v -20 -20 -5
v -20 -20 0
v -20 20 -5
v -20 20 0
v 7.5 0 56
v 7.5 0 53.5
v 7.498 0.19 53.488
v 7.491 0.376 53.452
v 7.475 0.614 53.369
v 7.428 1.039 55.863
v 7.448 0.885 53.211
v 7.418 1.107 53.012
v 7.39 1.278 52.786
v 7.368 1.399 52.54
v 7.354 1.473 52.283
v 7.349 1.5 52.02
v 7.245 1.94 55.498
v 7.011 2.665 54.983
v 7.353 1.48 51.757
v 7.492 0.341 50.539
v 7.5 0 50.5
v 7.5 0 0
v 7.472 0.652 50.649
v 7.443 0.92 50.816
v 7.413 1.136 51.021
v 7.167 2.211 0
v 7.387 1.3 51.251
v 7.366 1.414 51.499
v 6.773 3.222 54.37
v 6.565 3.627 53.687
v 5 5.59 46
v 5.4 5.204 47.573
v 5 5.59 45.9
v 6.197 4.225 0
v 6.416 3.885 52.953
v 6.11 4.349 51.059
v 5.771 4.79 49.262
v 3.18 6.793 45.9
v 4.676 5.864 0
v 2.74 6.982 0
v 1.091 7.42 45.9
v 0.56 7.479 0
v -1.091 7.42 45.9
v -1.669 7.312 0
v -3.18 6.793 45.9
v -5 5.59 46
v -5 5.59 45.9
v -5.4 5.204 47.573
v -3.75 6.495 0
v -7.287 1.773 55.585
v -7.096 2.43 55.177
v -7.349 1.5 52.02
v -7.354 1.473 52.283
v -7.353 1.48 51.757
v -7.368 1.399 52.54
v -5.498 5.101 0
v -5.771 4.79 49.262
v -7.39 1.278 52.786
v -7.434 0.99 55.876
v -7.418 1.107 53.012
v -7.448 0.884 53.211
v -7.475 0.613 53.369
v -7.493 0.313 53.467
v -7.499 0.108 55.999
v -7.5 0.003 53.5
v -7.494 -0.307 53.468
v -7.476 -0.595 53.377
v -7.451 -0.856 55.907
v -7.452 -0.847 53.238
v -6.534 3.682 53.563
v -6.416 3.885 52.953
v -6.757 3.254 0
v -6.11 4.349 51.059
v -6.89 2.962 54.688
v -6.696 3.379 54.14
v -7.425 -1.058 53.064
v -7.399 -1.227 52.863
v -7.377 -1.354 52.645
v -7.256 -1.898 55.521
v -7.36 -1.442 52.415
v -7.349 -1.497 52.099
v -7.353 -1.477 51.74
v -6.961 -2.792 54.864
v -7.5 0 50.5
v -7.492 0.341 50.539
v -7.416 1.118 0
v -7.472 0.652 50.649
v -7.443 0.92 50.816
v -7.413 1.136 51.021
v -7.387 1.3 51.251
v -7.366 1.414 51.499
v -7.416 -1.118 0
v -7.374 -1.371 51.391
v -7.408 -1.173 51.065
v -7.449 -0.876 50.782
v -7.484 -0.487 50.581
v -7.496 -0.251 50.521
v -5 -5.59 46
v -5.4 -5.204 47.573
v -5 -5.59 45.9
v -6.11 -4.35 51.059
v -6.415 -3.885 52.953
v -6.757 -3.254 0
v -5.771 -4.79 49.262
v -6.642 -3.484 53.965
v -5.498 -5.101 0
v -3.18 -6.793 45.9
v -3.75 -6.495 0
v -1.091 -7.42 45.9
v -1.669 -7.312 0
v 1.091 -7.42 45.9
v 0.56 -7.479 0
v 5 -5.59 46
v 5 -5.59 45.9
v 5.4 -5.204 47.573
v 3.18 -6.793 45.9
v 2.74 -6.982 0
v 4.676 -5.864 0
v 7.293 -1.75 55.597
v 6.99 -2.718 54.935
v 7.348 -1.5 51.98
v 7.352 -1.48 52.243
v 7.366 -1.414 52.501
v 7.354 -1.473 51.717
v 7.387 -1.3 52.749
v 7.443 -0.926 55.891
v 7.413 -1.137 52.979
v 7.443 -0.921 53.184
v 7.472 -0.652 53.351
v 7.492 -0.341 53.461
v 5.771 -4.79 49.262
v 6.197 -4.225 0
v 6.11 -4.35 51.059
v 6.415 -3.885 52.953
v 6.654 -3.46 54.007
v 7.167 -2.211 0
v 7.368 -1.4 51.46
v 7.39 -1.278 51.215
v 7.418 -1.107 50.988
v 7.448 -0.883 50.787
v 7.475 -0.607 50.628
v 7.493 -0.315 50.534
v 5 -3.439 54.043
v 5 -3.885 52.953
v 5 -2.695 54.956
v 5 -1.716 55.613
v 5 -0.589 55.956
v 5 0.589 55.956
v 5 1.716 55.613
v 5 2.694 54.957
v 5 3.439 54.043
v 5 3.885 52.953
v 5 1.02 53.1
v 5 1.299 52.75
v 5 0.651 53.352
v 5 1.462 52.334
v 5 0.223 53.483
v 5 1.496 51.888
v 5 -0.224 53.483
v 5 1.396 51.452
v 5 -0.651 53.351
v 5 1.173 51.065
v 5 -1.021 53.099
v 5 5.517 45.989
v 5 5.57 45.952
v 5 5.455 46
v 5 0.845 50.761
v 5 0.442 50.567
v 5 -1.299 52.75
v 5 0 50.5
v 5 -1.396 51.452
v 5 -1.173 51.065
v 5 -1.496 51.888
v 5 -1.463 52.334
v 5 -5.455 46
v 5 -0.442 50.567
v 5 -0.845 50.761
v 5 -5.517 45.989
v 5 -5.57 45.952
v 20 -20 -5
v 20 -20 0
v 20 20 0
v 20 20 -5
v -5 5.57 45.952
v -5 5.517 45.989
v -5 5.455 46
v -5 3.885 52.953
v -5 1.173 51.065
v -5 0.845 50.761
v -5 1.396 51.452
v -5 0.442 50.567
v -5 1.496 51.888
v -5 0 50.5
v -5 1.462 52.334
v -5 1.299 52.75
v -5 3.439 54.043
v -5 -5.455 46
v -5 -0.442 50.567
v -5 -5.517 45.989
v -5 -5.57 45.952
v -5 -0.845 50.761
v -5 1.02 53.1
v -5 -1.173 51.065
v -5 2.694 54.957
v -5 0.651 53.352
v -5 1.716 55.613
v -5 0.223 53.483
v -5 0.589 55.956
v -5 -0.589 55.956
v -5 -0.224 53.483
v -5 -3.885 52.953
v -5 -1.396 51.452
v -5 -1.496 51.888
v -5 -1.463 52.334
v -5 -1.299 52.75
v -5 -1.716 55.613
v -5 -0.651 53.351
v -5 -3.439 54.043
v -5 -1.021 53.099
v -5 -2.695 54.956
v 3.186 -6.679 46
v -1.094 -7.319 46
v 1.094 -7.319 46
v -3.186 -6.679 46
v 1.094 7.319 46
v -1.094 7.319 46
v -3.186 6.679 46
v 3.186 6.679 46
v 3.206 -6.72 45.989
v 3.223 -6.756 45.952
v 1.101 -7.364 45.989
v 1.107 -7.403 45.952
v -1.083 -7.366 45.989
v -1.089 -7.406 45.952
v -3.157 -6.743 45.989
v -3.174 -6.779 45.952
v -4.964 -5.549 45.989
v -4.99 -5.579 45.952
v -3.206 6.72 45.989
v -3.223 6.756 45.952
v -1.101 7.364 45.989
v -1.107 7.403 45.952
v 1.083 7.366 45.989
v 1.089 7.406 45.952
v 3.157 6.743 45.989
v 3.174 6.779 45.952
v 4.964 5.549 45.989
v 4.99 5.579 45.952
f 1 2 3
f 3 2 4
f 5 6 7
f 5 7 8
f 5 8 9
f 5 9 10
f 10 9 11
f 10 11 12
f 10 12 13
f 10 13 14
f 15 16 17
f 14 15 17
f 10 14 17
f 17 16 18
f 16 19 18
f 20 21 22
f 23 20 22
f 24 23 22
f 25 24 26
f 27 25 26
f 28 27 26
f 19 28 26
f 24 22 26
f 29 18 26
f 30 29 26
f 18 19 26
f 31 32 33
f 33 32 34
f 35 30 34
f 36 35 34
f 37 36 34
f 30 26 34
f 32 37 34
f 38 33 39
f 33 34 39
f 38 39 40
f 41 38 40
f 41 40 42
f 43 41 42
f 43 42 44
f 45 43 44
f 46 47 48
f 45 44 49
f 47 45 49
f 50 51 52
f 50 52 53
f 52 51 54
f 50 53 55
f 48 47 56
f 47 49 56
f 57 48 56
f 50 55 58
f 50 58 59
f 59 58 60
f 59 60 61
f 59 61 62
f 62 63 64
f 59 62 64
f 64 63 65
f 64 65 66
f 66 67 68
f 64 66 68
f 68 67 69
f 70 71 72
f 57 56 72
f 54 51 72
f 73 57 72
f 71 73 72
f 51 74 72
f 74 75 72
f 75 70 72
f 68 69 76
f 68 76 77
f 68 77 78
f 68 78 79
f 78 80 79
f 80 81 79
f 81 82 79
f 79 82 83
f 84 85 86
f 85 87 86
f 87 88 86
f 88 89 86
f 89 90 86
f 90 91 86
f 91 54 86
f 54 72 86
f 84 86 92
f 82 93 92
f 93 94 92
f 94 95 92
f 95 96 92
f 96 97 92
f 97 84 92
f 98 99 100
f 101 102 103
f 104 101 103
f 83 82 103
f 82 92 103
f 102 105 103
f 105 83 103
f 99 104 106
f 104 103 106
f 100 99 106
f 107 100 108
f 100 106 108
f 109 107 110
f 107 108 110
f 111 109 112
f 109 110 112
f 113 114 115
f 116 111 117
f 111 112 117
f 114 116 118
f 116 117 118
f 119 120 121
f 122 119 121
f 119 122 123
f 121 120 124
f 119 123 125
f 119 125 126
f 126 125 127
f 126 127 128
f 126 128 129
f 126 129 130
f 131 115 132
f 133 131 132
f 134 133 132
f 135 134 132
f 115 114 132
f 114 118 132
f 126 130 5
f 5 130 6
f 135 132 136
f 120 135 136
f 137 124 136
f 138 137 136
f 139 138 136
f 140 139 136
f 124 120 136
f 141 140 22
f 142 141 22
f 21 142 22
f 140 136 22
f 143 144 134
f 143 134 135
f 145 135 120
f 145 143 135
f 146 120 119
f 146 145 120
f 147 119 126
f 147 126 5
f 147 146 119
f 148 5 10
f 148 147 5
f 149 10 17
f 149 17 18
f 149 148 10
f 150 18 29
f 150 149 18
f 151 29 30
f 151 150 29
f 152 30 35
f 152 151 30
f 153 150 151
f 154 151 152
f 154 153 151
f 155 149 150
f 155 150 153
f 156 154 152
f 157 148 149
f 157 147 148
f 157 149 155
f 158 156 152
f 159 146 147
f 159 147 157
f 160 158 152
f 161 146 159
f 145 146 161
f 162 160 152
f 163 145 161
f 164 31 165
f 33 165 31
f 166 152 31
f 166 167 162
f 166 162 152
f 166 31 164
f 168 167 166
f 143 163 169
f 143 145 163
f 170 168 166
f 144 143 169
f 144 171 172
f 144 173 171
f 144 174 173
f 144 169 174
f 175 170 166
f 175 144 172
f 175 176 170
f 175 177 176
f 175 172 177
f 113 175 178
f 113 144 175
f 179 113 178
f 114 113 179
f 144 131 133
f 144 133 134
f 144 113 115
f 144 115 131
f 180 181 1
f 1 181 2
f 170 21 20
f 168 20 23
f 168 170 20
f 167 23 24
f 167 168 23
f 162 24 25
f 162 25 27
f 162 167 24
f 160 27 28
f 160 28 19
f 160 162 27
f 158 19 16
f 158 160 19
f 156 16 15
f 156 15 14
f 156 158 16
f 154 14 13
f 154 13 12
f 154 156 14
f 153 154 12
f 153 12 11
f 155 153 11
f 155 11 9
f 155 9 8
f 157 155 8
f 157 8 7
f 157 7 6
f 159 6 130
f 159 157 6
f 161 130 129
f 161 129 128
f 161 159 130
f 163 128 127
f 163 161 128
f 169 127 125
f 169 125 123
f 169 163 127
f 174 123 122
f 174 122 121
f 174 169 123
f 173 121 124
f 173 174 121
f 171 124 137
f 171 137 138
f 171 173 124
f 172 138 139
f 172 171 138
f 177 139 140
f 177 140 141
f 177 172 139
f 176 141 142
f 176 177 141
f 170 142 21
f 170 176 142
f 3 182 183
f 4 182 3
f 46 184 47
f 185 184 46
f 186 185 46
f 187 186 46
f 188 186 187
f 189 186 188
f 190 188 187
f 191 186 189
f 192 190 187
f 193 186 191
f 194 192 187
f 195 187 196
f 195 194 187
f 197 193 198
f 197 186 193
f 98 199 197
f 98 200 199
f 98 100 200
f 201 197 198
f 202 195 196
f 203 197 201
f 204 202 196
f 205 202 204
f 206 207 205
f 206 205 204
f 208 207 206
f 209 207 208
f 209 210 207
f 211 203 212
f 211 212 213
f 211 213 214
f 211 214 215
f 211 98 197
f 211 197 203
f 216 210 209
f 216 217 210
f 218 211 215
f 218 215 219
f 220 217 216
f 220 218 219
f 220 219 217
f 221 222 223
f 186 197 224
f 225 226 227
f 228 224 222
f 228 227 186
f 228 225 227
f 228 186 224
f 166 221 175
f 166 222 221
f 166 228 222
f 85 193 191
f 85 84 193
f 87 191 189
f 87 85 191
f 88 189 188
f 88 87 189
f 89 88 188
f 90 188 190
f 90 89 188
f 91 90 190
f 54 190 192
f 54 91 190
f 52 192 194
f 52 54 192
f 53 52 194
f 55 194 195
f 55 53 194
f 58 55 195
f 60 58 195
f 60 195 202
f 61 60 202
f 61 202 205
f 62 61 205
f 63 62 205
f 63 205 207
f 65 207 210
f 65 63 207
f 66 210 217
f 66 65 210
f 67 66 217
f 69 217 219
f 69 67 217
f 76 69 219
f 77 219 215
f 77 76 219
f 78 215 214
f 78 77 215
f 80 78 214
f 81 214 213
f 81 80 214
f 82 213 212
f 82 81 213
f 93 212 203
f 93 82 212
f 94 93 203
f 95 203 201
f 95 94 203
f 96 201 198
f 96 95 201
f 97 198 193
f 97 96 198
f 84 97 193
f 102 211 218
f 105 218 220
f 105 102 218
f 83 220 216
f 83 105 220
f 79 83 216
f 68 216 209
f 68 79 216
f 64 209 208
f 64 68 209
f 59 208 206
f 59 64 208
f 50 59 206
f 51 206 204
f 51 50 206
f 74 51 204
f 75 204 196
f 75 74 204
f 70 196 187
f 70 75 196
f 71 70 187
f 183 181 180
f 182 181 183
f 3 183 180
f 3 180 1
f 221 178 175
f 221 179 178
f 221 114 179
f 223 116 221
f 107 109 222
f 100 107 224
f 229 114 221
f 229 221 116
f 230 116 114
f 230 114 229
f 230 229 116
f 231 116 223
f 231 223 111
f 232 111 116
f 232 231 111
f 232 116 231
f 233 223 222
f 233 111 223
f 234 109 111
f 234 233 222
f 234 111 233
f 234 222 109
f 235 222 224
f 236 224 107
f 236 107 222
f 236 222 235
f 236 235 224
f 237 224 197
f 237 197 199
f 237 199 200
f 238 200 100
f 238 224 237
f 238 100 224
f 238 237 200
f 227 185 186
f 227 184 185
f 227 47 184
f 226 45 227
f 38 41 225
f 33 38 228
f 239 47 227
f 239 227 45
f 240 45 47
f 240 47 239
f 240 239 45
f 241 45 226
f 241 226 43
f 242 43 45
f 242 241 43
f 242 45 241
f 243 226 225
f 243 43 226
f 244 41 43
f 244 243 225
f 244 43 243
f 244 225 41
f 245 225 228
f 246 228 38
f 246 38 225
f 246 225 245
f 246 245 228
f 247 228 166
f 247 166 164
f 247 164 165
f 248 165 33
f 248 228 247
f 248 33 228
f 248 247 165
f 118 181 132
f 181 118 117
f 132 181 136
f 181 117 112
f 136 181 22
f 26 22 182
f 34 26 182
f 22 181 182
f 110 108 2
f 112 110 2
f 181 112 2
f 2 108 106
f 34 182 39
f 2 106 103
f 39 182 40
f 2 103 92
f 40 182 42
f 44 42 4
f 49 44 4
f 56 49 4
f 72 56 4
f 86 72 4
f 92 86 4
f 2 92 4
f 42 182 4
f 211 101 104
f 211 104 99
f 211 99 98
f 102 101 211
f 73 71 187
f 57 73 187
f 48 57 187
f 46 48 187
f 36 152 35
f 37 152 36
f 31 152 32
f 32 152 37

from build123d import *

# Parameters (mm, degrees)
SKETCH1_R               = 7.5
BOSS_EXTRUDE1_DEPTH     = 56
SKETCH2_W               = 10
SKETCH2_H               = 16
CUT_EXTRUDE1_DEPTH      = 10
CUT_EXTRUDE4_DEPTH      = 57.995613866
CUT_EXTRUDE4_DEPTH_BACK = 57.995613866
CUT_EXTRUDE5_DEPTH      = 57.995613991
CUT_EXTRUDE5_DEPTH_BACK = 57.995613991
SKETCH4_R               = 1.5
FILLET1_R               = 0.1
SKETCH5_W               = 40
SKETCH5_H               = 40
BOSS_EXTRUDE2_DEPTH     = 5


with BuildPart() as part:
    # Sketch1 → Boss-Extrude1 (new body)
    with BuildSketch(Plane.XY):
        Circle(SKETCH1_R)
    extrude(amount=BOSS_EXTRUDE1_DEPTH)

    # Sketch2 → Cut-Extrude1 (cut)
    with BuildSketch(Plane.XY.offset(56)):
        Rectangle(SKETCH2_W, SKETCH2_H)
    extrude(amount=-CUT_EXTRUDE1_DEPTH, mode=Mode.SUBTRACT)

    # Sketch3 → Cut-Extrude4 (cut, two sides: drawn at the far end of the back side and taken through both)
    with BuildSketch(Plane(origin=(0, 0, 0), x_dir=(0, 0, -1), z_dir=(1, 0, 0)).offset(-CUT_EXTRUDE4_DEPTH_BACK)):
        with BuildLine():
            Line((-46, -114.267763227), (-46, -7.5))
            Line((-46, -7.5), (-46, -5.590169944))
            Line((-46, -5.590169944), (-52.952744721, -3.885047998))
            ThreePointArc((-52.952744721, -3.885047998), (-55.999999999, -0.000262165), (-52.952923855, 3.884664175))
            Line((-52.952923855, 3.884664175), (-46, 5.590169944))
            Line((-46, 5.590169944), (-46, 7.5))
            Line((-46, 7.5), (-46, 114.267763227))
            Line((-46, 114.267763227), (-259.535526454, 114.267763227))
            Line((-259.535526454, 114.267763227), (-259.535526454, -114.267763227))
            Line((-259.535526454, -114.267763227), (-46, -114.267763227))
        make_face()
    extrude(amount=CUT_EXTRUDE4_DEPTH + CUT_EXTRUDE4_DEPTH_BACK, mode=Mode.SUBTRACT)

    # Sketch4 → Cut-Extrude5 (cut, two sides: drawn at the far end of the back side and taken through both)
    with BuildSketch(Plane(origin=(0, 0, 0), x_dir=(0, 0, -1), z_dir=(1, 0, 0)).offset(-CUT_EXTRUDE5_DEPTH_BACK)):
        with Locations(Location((-52, -0.000169944, 0), (0, 0, 0.006491373))):
            Circle(SKETCH4_R)
    extrude(amount=CUT_EXTRUDE5_DEPTH + CUT_EXTRUDE5_DEPTH_BACK, mode=Mode.SUBTRACT)

    # Fillet1
    # the kernel refuses this fillet: 0.1 mm, written as the material it takes off along each edge
    with BuildSketch(Plane(origin=(0, 0, 46), x_dir=(0.6911452834399255, -0.7227158481580054, 0), z_dir=(0.7227158481580054, 0.6911452834399255, 0))) as fillet1_piece_1_section:
        with BuildLine():
            CenterArc((7.5 - FILLET1_R, FILLET1_R), FILLET1_R, 270, 90)
            Line((7.5 - FILLET1_R, 0), (7.5, 0))
            Line((7.5, 0), (7.5, FILLET1_R))
        make_face()
    fillet1_piece_1 = revolve(axis=Axis((0, 0, 46), (0, 0, -1)), revolution_arc=87.441672972, mode=Mode.PRIVATE)
    fillet1_piece_1 = split(fillet1_piece_1, bisect_by=Plane(origin=(5, -5.569278278, 45.983069625), z_dir=(-1, 0, 0)), keep=Keep.TOP, mode=Mode.PRIVATE)
    fillet1_piece_1 = split(fillet1_piece_1, bisect_by=Plane(origin=(-5, -5.569278278, 45.983069625), z_dir=(1, 0, 0)), keep=Keep.TOP, mode=Mode.PRIVATE)
    add(fillet1_piece_1, mode=Mode.SUBTRACT)
    with BuildSketch(Plane(origin=(0, 0, 46), x_dir=(-0.6911452834399255, 0.7227158481580054, 0), z_dir=(-0.7227158481580054, -0.6911452834399255, 0))) as fillet1_piece_2_section:
        with BuildLine():
            CenterArc((7.5 - FILLET1_R, FILLET1_R), FILLET1_R, 270, 90)
            Line((7.5 - FILLET1_R, 0), (7.5, 0))
            Line((7.5, 0), (7.5, FILLET1_R))
        make_face()
    fillet1_piece_2 = revolve(axis=Axis((0, 0, 46), (0, 0, -1)), revolution_arc=87.441672972, mode=Mode.PRIVATE)
    fillet1_piece_2 = split(fillet1_piece_2, bisect_by=Plane(origin=(5, 5.569279246, 45.98306893), z_dir=(-1, 0, 0)), keep=Keep.TOP, mode=Mode.PRIVATE)
    fillet1_piece_2 = split(fillet1_piece_2, bisect_by=Plane(origin=(-5, 5.569279246, 45.98306893), z_dir=(1, 0, 0)), keep=Keep.TOP, mode=Mode.PRIVATE)
    add(fillet1_piece_2, mode=Mode.SUBTRACT)

    # Sketch5 → Boss-Extrude2 (add)
    with BuildSketch(Plane(origin=(0, 0, 0), x_dir=(-1, 0, 0), z_dir=(0, 0, -1))):
        Rectangle(SKETCH5_W, SKETCH5_H)
    extrude(amount=BOSS_EXTRUDE2_DEPTH)


solid = part.part
